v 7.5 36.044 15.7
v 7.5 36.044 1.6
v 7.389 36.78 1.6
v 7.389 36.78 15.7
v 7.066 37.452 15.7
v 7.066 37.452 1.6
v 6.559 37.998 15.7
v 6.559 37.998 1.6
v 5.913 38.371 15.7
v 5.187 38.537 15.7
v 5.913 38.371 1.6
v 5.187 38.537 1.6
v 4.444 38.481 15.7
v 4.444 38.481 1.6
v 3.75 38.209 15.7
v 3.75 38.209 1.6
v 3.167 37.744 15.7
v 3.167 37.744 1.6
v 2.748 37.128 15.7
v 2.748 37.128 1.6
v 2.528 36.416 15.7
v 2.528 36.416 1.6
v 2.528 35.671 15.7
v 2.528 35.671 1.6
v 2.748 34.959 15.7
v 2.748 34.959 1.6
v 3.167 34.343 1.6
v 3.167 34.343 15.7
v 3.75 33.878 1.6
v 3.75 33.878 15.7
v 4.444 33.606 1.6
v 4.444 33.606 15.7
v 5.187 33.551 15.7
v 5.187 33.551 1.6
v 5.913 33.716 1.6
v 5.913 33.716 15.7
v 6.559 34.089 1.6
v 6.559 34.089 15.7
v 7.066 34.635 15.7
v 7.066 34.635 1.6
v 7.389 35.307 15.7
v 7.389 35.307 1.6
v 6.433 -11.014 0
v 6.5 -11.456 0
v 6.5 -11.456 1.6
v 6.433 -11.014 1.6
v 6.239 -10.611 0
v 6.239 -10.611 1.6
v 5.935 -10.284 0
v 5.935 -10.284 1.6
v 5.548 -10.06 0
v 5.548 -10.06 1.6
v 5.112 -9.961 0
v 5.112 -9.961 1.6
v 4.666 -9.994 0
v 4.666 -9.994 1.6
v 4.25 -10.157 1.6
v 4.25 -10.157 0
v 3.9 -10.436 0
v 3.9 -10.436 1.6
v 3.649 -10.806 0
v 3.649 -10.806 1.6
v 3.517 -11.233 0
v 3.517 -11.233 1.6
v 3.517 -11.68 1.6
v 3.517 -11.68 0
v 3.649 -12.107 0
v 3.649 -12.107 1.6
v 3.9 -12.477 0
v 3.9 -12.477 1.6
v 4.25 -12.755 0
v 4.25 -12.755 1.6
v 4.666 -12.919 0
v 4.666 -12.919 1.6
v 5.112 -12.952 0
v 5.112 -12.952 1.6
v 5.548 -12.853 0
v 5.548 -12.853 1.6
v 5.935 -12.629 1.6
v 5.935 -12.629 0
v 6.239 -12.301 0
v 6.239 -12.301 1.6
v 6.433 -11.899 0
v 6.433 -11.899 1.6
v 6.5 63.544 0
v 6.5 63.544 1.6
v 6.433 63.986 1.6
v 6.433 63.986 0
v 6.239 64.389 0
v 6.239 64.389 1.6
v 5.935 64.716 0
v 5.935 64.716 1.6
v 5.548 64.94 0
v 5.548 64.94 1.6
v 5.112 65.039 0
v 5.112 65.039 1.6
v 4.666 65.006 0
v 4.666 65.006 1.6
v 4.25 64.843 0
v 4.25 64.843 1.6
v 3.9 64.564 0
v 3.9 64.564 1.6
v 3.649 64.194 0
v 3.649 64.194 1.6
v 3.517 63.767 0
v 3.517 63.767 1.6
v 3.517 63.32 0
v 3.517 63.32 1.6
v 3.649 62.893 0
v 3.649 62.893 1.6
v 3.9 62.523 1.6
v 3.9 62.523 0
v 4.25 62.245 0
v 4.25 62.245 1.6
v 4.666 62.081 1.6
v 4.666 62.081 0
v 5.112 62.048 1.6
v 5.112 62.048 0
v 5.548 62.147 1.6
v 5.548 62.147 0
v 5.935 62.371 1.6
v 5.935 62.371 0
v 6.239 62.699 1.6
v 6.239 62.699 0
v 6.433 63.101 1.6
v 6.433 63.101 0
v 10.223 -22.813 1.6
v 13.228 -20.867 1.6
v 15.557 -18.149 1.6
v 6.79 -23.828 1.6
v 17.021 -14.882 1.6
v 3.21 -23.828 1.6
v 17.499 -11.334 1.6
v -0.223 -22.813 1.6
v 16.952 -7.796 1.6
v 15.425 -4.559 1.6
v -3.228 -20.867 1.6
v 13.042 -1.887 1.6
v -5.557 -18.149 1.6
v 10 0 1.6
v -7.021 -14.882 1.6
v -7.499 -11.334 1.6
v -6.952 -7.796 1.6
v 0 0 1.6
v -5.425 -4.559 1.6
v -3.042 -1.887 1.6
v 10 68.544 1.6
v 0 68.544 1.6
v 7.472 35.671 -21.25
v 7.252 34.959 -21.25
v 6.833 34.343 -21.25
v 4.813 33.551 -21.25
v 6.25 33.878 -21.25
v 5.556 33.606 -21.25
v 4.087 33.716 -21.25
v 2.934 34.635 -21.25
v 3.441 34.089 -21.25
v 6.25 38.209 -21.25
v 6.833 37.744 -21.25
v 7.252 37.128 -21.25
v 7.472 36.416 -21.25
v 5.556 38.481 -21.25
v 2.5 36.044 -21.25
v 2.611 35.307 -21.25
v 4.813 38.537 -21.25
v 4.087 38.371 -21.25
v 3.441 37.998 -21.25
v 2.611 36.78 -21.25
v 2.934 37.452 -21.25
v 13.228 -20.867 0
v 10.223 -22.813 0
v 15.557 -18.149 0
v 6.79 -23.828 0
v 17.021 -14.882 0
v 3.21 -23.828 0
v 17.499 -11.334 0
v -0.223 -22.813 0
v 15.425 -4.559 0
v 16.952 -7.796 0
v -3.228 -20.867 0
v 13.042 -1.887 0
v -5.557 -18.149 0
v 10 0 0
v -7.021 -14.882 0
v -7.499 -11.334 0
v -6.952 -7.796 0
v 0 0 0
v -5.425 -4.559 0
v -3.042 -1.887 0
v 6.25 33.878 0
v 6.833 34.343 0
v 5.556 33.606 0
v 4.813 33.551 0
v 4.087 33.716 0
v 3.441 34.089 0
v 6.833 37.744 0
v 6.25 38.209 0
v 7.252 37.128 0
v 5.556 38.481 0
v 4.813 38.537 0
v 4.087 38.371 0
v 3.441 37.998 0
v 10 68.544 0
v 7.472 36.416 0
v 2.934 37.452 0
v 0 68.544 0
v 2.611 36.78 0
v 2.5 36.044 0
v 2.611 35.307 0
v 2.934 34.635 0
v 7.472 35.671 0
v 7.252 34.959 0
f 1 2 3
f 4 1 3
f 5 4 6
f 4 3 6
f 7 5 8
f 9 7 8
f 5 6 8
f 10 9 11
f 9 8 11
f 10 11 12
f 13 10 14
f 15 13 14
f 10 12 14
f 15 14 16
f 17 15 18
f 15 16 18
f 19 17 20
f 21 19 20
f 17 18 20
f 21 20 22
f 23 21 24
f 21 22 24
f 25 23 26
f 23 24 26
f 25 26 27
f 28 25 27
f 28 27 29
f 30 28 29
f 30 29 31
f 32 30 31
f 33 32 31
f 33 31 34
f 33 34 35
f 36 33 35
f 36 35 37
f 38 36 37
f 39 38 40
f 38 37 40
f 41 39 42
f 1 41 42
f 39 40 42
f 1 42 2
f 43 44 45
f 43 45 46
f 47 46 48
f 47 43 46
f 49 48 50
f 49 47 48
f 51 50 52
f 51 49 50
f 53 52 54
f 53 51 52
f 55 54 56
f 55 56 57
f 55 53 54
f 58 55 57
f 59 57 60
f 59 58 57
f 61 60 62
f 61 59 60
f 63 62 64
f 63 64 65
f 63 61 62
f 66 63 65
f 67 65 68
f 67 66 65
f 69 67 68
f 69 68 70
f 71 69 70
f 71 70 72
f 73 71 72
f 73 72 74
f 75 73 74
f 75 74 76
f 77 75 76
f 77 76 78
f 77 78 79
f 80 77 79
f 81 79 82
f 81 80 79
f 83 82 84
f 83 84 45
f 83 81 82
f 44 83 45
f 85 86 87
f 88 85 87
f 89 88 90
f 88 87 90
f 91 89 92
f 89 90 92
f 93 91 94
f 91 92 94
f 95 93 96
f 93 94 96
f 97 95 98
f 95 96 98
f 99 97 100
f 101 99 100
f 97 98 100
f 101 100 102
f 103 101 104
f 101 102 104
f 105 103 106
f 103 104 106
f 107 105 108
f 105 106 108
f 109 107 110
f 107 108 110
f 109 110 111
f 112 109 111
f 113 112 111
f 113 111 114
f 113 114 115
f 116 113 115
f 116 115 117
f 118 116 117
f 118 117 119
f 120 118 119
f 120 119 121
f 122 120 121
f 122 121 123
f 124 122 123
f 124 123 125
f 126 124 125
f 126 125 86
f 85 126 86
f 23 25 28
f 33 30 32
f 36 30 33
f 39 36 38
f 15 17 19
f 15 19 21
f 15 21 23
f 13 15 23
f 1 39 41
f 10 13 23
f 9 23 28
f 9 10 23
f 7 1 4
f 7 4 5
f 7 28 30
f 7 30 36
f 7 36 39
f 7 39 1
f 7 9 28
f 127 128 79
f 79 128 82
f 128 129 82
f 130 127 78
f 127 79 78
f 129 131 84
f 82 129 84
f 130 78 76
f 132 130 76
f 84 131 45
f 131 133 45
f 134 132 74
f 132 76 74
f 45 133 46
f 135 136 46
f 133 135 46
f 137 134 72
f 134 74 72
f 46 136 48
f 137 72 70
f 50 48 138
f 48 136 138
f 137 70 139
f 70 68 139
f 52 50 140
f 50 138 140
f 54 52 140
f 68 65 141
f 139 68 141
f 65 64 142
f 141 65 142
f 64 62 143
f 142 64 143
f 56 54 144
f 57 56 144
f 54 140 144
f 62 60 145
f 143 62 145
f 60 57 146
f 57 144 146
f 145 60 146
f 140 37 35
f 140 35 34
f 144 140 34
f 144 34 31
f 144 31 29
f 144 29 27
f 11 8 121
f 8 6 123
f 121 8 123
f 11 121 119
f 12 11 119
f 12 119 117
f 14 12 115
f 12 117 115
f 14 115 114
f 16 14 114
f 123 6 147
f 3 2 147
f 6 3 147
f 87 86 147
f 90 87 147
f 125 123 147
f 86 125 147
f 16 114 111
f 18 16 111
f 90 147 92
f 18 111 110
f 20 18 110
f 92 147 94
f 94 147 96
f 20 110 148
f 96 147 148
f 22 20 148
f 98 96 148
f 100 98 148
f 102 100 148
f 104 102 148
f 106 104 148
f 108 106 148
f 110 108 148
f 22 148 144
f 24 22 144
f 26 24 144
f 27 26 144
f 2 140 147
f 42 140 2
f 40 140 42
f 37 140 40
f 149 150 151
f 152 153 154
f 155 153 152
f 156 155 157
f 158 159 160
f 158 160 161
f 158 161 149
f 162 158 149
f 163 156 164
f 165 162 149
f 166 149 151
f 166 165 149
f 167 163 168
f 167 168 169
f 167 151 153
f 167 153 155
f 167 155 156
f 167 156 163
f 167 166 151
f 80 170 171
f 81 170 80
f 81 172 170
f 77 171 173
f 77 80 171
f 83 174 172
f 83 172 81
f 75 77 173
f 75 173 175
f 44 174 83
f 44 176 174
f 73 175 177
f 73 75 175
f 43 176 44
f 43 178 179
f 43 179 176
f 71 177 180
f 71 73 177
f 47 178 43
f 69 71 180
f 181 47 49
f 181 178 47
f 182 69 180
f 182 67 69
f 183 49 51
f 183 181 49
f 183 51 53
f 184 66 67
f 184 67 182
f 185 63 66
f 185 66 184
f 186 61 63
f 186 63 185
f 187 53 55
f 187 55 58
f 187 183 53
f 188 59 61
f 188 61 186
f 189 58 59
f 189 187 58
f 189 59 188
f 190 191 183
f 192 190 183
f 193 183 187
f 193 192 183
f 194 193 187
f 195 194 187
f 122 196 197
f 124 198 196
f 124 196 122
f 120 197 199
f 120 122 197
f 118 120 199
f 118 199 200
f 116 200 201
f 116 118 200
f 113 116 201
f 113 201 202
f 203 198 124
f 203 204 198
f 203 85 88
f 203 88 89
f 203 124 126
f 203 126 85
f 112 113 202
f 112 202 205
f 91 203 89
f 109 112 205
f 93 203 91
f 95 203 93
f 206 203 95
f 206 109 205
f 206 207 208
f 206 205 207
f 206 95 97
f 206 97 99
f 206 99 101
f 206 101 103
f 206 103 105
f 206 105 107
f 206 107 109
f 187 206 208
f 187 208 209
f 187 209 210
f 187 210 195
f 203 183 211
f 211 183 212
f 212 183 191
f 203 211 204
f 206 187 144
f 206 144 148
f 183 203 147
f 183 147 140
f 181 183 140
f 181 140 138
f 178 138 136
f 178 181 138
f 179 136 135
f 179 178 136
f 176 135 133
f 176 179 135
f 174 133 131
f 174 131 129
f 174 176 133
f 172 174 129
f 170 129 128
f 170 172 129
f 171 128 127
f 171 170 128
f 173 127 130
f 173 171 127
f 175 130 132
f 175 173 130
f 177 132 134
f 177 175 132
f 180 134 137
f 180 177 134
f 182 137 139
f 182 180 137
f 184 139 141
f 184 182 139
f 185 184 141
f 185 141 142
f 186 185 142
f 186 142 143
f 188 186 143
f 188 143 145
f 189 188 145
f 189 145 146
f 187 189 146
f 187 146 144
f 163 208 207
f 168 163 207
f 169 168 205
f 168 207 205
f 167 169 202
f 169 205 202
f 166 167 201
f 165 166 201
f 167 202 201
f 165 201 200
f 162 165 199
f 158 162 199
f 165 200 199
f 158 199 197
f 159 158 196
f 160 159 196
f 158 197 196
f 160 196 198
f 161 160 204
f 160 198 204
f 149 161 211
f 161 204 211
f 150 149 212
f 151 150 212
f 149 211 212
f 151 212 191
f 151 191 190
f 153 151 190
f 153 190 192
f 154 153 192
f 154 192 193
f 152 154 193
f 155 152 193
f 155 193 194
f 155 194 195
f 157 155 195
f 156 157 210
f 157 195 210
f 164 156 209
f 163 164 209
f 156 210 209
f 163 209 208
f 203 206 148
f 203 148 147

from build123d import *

# Parameters (mm, degrees)
SKETCH1_R           = 1.5
BOSS_EXTRUDE1_DEPTH = 1.6
SKETCH2_R           = 1.5
CUT_EXTRUDE1_DEPTH  = 2.6
SKETCH3_R           = 2.5
BOSS_EXTRUDE2_DEPTH = 14.1
SKETCH4_R           = 2.5
BOSS_EXTRUDE3_DEPTH = 21.25


with BuildPart() as part:
    # Sketch1 → Boss-Extrude1 (new body)
    with BuildSketch(Plane.XY):
        with BuildLine():
            Line((0, 0), (0, 68.543560763))
            Line((0, 68.543560763), (10, 68.543560763))
            Line((10, 68.543560763), (10, 0))
            ThreePointArc((10, 0), (5, -23.956439237), (0, 0))
        make_face()
        with Locations((5, -11.456439237)):
            Circle(SKETCH1_R, mode=Mode.SUBTRACT)
    extrude(amount=BOSS_EXTRUDE1_DEPTH)

    # Sketch2 → Cut-Extrude1 (cut, through all)
    with BuildSketch(Plane.XY.offset(1.6)):
        with Locations((5, 63.543560763)):
            Circle(SKETCH2_R)
    extrude(amount=-CUT_EXTRUDE1_DEPTH, mode=Mode.SUBTRACT)

    # Sketch3 → Boss-Extrude2 (add)
    with BuildSketch(Plane.XY.offset(1.6)):
        with Locations((5, 36.043560763)):
            Circle(SKETCH3_R)
    extrude(amount=BOSS_EXTRUDE2_DEPTH)

    # Sketch4 → Boss-Extrude3 (add)
    with BuildSketch(Plane(origin=(0, 0, 0), x_dir=(-1, 0, 0), z_dir=(0, 0, -1))):
        with Locations((-5, 36.043560763)):
            Circle(SKETCH4_R)
    extrude(amount=BOSS_EXTRUDE3_DEPTH)


solid = part.part
